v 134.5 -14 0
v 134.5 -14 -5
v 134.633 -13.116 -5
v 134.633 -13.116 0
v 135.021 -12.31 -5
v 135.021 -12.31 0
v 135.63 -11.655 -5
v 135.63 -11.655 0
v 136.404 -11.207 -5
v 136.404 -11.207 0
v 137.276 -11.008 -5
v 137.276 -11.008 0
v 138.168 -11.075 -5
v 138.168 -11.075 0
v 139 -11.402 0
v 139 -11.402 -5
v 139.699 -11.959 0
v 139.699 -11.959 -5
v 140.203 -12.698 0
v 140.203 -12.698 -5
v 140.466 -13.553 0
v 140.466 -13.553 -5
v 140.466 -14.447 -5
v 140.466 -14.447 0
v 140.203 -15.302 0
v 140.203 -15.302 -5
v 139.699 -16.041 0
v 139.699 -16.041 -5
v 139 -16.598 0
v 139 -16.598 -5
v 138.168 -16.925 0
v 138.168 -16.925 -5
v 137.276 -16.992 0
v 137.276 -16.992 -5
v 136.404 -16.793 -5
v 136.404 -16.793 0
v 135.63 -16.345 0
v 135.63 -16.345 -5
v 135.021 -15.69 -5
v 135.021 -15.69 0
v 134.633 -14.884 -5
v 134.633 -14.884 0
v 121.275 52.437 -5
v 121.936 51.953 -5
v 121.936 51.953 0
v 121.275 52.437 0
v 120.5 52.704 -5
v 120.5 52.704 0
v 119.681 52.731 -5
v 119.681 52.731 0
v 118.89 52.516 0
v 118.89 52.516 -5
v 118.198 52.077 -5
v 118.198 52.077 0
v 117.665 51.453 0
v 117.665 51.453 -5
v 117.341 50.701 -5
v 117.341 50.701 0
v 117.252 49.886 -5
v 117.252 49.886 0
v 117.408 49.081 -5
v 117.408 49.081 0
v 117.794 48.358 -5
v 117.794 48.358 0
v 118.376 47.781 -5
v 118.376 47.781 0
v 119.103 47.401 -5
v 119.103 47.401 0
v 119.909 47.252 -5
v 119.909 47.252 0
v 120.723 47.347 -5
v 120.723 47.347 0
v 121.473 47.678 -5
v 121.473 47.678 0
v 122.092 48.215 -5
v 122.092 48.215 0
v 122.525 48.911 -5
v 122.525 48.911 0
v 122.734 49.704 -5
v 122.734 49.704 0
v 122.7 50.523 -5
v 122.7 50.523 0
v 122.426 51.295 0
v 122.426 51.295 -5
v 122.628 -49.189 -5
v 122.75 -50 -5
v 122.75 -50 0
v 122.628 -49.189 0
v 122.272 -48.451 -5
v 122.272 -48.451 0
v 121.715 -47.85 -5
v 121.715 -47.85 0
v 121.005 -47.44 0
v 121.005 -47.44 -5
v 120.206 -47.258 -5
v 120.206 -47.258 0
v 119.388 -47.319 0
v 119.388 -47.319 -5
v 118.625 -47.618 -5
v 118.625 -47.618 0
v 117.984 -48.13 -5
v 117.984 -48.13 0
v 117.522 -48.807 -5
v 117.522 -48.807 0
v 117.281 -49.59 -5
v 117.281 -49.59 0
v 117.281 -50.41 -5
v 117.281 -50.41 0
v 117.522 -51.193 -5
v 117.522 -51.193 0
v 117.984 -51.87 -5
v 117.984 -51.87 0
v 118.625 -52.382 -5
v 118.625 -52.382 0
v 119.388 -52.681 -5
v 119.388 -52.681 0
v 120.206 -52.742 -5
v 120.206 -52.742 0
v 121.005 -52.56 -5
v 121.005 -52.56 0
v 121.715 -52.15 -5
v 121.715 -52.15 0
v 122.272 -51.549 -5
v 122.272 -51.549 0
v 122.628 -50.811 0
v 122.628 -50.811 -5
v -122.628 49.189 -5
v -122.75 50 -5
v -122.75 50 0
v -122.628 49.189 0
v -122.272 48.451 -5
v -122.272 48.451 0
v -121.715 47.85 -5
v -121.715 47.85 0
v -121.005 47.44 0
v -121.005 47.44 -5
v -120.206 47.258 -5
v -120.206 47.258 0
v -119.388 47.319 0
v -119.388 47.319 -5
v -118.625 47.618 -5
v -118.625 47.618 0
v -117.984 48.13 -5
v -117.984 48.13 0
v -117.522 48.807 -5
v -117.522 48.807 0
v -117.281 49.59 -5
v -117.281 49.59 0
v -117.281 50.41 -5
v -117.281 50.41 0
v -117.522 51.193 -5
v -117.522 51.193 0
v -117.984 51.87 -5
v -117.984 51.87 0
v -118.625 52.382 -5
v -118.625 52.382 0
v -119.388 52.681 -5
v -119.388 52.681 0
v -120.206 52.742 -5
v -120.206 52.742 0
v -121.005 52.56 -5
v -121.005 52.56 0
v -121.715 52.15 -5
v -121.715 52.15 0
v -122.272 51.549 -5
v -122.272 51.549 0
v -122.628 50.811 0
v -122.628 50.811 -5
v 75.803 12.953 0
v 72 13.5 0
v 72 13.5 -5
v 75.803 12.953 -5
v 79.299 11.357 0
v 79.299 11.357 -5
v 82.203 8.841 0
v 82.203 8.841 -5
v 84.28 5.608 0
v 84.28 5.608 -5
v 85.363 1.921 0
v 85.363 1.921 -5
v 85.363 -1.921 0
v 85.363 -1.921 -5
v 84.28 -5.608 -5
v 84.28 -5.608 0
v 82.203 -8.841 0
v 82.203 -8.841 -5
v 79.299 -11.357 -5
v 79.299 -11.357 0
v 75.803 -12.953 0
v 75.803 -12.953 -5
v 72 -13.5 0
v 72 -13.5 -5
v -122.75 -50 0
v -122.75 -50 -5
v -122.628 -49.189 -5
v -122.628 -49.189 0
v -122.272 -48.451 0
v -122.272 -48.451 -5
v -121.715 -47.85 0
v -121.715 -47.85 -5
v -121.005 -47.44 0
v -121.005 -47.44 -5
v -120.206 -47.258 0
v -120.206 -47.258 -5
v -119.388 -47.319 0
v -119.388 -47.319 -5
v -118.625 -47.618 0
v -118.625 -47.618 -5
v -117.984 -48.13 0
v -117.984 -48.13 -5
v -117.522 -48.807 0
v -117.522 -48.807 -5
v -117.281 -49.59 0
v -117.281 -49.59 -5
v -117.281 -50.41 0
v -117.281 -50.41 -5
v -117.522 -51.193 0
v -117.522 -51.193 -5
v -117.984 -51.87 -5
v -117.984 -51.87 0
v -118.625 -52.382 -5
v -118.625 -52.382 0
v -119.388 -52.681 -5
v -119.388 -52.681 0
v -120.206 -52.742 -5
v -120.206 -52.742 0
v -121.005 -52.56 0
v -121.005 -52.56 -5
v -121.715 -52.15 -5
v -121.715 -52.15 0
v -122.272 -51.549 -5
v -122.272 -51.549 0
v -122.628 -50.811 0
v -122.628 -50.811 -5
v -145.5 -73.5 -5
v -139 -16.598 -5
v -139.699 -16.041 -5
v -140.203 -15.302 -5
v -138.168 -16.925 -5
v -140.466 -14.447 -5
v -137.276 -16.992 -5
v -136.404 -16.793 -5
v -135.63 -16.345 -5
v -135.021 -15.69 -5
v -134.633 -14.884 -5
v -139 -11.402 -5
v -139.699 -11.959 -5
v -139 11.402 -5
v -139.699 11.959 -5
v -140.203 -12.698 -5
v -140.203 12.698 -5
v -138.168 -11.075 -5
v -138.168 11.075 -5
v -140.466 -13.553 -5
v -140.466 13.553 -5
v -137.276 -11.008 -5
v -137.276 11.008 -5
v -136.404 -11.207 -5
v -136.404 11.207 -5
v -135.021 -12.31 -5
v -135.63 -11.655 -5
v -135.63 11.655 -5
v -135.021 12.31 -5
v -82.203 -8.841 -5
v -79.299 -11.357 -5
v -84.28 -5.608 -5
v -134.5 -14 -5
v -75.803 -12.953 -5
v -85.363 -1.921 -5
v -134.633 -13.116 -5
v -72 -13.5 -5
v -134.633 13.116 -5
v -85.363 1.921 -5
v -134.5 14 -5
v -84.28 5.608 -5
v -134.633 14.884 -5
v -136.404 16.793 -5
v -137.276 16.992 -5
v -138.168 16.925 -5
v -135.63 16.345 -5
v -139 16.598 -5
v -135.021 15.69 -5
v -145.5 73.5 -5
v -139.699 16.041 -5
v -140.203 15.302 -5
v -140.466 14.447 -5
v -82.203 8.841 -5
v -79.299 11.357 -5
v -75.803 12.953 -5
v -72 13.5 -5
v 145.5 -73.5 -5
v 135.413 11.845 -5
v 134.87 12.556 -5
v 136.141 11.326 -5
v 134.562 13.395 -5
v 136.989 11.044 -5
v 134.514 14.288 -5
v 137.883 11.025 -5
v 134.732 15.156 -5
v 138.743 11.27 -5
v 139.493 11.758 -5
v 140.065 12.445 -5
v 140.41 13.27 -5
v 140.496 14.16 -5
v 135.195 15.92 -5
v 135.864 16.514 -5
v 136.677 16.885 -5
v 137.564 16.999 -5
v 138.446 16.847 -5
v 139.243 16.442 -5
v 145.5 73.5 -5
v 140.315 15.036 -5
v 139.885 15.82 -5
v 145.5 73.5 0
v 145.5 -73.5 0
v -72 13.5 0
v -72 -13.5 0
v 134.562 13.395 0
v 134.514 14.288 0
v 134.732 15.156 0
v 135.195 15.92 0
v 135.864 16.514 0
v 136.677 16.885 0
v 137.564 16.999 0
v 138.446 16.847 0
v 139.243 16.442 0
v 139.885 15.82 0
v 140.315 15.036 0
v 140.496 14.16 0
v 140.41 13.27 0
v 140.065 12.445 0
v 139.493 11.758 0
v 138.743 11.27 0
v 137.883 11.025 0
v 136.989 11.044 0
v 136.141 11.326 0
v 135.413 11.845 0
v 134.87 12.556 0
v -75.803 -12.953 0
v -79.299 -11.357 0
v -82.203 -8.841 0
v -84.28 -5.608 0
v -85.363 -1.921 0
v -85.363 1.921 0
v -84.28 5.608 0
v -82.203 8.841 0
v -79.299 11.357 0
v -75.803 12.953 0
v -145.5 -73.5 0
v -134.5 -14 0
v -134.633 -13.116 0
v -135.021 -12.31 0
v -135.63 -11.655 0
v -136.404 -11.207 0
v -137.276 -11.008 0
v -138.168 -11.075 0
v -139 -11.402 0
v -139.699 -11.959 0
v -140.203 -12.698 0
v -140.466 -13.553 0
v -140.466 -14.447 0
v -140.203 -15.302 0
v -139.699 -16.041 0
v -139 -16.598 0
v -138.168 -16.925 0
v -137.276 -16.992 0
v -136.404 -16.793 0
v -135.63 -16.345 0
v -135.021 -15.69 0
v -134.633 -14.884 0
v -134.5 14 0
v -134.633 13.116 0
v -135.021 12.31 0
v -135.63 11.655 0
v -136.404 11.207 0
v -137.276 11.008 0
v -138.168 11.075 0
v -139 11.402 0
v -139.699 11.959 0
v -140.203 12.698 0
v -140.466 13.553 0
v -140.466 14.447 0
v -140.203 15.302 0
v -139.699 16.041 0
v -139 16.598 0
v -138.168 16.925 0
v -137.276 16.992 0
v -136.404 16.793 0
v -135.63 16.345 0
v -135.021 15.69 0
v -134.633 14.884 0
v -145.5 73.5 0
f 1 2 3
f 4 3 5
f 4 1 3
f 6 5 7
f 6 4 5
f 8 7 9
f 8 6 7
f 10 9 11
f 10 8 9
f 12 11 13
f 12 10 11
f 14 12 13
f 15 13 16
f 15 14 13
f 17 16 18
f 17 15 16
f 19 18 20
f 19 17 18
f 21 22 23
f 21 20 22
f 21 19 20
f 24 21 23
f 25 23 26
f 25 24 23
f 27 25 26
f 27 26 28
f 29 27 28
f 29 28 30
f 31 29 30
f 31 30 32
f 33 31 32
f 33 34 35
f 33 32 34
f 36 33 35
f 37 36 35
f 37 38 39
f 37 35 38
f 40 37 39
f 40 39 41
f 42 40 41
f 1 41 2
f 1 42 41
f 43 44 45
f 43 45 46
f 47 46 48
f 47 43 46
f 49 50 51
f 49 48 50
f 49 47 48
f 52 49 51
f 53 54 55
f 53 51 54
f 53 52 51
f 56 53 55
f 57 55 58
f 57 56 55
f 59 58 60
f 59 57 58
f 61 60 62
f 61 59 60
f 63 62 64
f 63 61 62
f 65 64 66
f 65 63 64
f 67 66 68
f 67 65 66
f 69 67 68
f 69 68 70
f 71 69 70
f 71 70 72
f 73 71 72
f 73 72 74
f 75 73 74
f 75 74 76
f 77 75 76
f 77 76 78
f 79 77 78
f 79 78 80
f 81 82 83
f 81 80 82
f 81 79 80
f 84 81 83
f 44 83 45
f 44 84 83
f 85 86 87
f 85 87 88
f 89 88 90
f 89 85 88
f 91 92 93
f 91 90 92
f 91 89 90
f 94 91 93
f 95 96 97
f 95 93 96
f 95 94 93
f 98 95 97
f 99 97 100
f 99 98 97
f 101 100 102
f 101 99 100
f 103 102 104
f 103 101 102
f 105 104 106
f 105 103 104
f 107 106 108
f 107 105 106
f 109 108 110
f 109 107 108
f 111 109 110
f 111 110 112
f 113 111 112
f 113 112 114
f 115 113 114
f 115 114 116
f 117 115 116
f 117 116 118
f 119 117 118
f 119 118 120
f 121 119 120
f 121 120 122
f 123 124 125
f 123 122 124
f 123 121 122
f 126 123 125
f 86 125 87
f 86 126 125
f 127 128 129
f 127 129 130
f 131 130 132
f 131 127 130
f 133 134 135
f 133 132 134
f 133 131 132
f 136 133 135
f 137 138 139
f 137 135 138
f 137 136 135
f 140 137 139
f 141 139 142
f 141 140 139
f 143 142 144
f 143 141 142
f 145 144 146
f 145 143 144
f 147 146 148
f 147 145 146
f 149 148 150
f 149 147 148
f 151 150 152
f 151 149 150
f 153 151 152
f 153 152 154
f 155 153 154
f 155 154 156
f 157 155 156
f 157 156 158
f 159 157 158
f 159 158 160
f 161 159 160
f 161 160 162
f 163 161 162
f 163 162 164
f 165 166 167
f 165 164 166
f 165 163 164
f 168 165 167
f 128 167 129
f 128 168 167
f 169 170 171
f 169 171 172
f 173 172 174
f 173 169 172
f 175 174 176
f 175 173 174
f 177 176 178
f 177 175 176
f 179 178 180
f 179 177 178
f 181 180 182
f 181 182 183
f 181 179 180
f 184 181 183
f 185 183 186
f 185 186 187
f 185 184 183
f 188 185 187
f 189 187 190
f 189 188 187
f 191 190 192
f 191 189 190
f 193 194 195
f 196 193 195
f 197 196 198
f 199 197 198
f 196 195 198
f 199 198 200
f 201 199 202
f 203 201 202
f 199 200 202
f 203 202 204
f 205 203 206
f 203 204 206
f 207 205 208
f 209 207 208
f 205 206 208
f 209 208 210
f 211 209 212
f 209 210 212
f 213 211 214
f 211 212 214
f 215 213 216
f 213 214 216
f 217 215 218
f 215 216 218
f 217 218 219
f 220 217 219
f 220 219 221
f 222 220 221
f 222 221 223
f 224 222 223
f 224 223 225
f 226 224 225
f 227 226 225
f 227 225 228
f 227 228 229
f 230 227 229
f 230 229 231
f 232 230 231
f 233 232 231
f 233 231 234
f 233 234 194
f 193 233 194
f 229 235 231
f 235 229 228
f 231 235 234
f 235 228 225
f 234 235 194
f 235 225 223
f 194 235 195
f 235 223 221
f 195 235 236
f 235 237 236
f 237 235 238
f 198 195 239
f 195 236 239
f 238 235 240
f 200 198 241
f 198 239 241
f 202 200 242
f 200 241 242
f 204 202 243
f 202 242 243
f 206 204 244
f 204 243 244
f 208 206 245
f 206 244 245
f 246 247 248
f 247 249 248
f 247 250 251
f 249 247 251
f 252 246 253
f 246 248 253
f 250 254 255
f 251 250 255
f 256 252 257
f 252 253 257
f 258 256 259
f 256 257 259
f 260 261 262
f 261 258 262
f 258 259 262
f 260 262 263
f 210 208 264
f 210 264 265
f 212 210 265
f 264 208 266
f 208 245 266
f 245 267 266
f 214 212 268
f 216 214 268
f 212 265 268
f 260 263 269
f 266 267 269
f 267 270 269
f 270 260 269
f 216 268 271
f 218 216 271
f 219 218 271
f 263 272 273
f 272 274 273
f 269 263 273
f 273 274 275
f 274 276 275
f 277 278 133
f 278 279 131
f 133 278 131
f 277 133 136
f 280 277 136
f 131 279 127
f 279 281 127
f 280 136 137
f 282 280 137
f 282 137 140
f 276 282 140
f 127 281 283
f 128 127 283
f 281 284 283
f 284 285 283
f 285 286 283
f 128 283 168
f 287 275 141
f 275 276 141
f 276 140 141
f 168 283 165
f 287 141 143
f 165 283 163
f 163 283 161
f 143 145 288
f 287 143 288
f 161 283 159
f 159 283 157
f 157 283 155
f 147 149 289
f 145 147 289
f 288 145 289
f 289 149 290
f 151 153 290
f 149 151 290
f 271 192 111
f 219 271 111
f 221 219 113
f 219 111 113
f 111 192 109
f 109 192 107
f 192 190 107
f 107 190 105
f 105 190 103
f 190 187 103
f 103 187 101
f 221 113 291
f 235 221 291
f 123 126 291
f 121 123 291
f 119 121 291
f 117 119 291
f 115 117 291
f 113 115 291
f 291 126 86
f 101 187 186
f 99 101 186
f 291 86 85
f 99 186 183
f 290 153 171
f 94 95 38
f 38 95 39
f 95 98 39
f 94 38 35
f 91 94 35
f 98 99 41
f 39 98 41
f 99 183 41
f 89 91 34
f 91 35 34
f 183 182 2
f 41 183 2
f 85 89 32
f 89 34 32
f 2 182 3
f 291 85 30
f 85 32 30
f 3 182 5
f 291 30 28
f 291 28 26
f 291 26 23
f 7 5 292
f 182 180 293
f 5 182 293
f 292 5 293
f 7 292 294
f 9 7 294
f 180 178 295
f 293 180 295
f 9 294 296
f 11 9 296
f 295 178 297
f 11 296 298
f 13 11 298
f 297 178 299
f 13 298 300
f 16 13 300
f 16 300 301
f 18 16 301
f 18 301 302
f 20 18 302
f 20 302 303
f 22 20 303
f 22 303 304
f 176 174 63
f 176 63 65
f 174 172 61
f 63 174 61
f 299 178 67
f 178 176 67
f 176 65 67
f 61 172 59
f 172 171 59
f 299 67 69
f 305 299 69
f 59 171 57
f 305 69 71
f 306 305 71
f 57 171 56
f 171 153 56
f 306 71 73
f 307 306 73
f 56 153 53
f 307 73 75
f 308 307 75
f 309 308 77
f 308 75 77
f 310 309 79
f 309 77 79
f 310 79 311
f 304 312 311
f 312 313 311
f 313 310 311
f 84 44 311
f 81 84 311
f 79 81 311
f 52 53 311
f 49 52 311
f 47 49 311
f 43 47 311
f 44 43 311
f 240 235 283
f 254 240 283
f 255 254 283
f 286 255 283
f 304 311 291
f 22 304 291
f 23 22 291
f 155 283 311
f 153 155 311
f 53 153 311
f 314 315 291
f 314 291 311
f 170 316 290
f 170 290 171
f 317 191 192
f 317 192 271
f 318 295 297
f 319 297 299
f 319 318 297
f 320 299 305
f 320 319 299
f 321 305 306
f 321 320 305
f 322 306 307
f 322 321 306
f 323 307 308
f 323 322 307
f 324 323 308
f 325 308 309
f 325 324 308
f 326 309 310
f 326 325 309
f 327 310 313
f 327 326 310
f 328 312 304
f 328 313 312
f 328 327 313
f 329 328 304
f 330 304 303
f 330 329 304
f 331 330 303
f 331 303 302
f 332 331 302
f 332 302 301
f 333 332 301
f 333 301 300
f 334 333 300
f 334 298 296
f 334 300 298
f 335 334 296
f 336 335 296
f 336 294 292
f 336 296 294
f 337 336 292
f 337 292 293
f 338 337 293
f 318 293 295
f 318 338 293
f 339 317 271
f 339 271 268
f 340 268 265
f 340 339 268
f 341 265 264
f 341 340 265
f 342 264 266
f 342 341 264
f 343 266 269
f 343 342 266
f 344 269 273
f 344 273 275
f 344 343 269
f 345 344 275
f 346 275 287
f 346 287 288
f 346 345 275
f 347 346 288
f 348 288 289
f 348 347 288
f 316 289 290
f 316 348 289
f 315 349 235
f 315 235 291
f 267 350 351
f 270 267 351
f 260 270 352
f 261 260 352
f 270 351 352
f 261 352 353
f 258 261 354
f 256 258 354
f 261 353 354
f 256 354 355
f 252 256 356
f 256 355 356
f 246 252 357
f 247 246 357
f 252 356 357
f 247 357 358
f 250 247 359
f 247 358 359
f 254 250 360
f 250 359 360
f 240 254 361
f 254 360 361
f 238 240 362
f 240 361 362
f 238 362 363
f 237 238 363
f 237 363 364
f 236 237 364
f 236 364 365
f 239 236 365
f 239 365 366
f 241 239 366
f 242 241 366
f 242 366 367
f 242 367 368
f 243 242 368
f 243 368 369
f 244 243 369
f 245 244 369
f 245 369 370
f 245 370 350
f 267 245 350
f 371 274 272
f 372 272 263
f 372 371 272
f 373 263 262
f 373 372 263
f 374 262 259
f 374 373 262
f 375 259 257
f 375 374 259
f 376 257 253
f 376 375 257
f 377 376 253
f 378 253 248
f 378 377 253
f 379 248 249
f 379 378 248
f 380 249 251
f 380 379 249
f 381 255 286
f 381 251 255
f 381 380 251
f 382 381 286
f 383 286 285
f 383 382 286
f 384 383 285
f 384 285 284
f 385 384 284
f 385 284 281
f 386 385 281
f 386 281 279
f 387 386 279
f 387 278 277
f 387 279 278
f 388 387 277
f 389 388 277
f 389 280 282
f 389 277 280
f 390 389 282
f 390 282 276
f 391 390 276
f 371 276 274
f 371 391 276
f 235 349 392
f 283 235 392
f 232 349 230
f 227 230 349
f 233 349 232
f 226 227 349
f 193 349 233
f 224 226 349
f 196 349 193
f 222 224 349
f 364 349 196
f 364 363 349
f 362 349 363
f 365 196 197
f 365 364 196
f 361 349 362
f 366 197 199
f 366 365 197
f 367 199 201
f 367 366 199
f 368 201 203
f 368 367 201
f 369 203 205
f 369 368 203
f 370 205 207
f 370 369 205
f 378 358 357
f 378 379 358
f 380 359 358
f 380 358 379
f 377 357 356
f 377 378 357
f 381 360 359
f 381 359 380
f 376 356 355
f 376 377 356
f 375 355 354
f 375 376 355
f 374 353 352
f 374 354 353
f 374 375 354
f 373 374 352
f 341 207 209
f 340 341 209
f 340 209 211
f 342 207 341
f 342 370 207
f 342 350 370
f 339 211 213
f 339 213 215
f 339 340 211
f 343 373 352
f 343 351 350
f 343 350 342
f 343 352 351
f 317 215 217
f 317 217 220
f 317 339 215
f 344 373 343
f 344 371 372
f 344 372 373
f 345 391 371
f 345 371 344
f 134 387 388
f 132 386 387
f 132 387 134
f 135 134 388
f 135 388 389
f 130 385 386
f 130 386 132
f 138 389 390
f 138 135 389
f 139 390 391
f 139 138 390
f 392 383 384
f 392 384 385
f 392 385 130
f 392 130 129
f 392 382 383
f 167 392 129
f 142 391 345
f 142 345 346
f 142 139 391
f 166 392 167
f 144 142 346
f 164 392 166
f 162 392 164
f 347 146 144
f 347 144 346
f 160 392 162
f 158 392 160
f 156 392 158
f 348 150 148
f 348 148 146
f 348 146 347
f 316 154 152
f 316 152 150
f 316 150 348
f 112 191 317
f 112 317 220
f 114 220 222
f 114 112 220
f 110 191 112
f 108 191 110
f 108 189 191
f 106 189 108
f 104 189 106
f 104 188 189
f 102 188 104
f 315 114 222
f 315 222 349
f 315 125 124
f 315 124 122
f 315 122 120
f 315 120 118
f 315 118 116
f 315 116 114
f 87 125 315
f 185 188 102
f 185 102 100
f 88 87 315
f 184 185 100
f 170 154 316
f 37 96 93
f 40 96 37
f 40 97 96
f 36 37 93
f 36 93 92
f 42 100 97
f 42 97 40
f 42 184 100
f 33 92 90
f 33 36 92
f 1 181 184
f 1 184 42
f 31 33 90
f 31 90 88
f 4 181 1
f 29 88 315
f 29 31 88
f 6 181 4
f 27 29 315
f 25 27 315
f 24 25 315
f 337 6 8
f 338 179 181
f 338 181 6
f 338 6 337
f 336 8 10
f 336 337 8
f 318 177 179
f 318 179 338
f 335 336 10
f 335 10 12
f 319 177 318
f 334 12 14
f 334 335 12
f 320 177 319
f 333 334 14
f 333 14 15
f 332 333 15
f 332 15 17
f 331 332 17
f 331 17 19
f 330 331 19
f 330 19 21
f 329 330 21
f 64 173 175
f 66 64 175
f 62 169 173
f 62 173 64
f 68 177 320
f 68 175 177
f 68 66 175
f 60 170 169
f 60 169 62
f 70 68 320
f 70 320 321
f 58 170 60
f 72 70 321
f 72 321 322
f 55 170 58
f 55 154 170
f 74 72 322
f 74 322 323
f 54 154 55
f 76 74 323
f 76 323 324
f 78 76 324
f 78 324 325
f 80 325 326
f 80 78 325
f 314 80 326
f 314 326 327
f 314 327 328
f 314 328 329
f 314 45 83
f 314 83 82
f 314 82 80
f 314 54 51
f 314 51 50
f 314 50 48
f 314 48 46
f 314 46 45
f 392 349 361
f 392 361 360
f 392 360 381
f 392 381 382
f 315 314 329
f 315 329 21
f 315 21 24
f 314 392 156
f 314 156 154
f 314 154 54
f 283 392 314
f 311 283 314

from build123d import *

# Parameters (mm, degrees)
F2_W     = 291
F2_H     = 147
F3_DEPTH = 5
F5_D     = 5.5
F6_R     = 3
F7_DEPTH = 5.001


# Not quite as in the source:
# - a pattern or mirror of a feature is missing from the dataset's text; its kind, count and spacing are read off the source's solid


with BuildPart() as f3:
    # F2 (on Top) → F3 (new body)
    with BuildSketch(Plane.XY):
        Rectangle(F2_W, F2_H)
        with BuildLine():
            ThreePointArc((-72, -13.5), (-85.5, 0), (-72, 13.5))
            Line((-72, 13.5), (72, 13.5))
            ThreePointArc((72, 13.5), (85.5, 0), (72, -13.5))
            Line((72, -13.5), (-72, -13.5))
        make_face(mode=Mode.SUBTRACT)
    extrude(amount=-F3_DEPTH)

    # F5 (through all)
    with Locations(Plane.XY):
        with Locations((-120, -50)):
            f5 = Hole(F5_D / 2)

    # F5_copies: F5 across plane
    add(f5.mirror(Plane(origin=(0, 0, 0), x_dir=(0, 0, 1), z_dir=(1, 0, 0))), mode=Mode.SUBTRACT)

    # F5_copies1: F5 across plane
    add(f5.mirror(Plane.ZX), mode=Mode.SUBTRACT)

    # F5_copies2: F5 across plane
    add(f5.mirror(Plane(origin=(0, 0, 0), x_dir=(-0.3846153846, 0.9230769231, 0), z_dir=(0.9230769231, 0.3846153846, 0))), mode=Mode.SUBTRACT)

    # F6 (on Top) → F7 (cut, through all)
    with BuildSketch(Plane.XY):
        with Locations((-137.5, -14)):
            Circle(F6_R)
    f7 = extrude(amount=-F7_DEPTH, mode=Mode.SUBTRACT)

    # F7_copies: F7 across plane
    add(f7.mirror(Plane(origin=(0, 0, 0), x_dir=(0, 0, 1), z_dir=(1, 0, 0))), mode=Mode.SUBTRACT)

    # F7_copies1: F7 across plane
    add(f7.mirror(Plane.ZX), mode=Mode.SUBTRACT)

    # F7_copies2: F7 across plane
    add(f7.mirror(Plane(origin=(0, 0, 0), x_dir=(-0.1012944786, 0.9948564864, 0), z_dir=(0.9948564864, 0.1012944786, 0))), mode=Mode.SUBTRACT)


solid = f3.part
